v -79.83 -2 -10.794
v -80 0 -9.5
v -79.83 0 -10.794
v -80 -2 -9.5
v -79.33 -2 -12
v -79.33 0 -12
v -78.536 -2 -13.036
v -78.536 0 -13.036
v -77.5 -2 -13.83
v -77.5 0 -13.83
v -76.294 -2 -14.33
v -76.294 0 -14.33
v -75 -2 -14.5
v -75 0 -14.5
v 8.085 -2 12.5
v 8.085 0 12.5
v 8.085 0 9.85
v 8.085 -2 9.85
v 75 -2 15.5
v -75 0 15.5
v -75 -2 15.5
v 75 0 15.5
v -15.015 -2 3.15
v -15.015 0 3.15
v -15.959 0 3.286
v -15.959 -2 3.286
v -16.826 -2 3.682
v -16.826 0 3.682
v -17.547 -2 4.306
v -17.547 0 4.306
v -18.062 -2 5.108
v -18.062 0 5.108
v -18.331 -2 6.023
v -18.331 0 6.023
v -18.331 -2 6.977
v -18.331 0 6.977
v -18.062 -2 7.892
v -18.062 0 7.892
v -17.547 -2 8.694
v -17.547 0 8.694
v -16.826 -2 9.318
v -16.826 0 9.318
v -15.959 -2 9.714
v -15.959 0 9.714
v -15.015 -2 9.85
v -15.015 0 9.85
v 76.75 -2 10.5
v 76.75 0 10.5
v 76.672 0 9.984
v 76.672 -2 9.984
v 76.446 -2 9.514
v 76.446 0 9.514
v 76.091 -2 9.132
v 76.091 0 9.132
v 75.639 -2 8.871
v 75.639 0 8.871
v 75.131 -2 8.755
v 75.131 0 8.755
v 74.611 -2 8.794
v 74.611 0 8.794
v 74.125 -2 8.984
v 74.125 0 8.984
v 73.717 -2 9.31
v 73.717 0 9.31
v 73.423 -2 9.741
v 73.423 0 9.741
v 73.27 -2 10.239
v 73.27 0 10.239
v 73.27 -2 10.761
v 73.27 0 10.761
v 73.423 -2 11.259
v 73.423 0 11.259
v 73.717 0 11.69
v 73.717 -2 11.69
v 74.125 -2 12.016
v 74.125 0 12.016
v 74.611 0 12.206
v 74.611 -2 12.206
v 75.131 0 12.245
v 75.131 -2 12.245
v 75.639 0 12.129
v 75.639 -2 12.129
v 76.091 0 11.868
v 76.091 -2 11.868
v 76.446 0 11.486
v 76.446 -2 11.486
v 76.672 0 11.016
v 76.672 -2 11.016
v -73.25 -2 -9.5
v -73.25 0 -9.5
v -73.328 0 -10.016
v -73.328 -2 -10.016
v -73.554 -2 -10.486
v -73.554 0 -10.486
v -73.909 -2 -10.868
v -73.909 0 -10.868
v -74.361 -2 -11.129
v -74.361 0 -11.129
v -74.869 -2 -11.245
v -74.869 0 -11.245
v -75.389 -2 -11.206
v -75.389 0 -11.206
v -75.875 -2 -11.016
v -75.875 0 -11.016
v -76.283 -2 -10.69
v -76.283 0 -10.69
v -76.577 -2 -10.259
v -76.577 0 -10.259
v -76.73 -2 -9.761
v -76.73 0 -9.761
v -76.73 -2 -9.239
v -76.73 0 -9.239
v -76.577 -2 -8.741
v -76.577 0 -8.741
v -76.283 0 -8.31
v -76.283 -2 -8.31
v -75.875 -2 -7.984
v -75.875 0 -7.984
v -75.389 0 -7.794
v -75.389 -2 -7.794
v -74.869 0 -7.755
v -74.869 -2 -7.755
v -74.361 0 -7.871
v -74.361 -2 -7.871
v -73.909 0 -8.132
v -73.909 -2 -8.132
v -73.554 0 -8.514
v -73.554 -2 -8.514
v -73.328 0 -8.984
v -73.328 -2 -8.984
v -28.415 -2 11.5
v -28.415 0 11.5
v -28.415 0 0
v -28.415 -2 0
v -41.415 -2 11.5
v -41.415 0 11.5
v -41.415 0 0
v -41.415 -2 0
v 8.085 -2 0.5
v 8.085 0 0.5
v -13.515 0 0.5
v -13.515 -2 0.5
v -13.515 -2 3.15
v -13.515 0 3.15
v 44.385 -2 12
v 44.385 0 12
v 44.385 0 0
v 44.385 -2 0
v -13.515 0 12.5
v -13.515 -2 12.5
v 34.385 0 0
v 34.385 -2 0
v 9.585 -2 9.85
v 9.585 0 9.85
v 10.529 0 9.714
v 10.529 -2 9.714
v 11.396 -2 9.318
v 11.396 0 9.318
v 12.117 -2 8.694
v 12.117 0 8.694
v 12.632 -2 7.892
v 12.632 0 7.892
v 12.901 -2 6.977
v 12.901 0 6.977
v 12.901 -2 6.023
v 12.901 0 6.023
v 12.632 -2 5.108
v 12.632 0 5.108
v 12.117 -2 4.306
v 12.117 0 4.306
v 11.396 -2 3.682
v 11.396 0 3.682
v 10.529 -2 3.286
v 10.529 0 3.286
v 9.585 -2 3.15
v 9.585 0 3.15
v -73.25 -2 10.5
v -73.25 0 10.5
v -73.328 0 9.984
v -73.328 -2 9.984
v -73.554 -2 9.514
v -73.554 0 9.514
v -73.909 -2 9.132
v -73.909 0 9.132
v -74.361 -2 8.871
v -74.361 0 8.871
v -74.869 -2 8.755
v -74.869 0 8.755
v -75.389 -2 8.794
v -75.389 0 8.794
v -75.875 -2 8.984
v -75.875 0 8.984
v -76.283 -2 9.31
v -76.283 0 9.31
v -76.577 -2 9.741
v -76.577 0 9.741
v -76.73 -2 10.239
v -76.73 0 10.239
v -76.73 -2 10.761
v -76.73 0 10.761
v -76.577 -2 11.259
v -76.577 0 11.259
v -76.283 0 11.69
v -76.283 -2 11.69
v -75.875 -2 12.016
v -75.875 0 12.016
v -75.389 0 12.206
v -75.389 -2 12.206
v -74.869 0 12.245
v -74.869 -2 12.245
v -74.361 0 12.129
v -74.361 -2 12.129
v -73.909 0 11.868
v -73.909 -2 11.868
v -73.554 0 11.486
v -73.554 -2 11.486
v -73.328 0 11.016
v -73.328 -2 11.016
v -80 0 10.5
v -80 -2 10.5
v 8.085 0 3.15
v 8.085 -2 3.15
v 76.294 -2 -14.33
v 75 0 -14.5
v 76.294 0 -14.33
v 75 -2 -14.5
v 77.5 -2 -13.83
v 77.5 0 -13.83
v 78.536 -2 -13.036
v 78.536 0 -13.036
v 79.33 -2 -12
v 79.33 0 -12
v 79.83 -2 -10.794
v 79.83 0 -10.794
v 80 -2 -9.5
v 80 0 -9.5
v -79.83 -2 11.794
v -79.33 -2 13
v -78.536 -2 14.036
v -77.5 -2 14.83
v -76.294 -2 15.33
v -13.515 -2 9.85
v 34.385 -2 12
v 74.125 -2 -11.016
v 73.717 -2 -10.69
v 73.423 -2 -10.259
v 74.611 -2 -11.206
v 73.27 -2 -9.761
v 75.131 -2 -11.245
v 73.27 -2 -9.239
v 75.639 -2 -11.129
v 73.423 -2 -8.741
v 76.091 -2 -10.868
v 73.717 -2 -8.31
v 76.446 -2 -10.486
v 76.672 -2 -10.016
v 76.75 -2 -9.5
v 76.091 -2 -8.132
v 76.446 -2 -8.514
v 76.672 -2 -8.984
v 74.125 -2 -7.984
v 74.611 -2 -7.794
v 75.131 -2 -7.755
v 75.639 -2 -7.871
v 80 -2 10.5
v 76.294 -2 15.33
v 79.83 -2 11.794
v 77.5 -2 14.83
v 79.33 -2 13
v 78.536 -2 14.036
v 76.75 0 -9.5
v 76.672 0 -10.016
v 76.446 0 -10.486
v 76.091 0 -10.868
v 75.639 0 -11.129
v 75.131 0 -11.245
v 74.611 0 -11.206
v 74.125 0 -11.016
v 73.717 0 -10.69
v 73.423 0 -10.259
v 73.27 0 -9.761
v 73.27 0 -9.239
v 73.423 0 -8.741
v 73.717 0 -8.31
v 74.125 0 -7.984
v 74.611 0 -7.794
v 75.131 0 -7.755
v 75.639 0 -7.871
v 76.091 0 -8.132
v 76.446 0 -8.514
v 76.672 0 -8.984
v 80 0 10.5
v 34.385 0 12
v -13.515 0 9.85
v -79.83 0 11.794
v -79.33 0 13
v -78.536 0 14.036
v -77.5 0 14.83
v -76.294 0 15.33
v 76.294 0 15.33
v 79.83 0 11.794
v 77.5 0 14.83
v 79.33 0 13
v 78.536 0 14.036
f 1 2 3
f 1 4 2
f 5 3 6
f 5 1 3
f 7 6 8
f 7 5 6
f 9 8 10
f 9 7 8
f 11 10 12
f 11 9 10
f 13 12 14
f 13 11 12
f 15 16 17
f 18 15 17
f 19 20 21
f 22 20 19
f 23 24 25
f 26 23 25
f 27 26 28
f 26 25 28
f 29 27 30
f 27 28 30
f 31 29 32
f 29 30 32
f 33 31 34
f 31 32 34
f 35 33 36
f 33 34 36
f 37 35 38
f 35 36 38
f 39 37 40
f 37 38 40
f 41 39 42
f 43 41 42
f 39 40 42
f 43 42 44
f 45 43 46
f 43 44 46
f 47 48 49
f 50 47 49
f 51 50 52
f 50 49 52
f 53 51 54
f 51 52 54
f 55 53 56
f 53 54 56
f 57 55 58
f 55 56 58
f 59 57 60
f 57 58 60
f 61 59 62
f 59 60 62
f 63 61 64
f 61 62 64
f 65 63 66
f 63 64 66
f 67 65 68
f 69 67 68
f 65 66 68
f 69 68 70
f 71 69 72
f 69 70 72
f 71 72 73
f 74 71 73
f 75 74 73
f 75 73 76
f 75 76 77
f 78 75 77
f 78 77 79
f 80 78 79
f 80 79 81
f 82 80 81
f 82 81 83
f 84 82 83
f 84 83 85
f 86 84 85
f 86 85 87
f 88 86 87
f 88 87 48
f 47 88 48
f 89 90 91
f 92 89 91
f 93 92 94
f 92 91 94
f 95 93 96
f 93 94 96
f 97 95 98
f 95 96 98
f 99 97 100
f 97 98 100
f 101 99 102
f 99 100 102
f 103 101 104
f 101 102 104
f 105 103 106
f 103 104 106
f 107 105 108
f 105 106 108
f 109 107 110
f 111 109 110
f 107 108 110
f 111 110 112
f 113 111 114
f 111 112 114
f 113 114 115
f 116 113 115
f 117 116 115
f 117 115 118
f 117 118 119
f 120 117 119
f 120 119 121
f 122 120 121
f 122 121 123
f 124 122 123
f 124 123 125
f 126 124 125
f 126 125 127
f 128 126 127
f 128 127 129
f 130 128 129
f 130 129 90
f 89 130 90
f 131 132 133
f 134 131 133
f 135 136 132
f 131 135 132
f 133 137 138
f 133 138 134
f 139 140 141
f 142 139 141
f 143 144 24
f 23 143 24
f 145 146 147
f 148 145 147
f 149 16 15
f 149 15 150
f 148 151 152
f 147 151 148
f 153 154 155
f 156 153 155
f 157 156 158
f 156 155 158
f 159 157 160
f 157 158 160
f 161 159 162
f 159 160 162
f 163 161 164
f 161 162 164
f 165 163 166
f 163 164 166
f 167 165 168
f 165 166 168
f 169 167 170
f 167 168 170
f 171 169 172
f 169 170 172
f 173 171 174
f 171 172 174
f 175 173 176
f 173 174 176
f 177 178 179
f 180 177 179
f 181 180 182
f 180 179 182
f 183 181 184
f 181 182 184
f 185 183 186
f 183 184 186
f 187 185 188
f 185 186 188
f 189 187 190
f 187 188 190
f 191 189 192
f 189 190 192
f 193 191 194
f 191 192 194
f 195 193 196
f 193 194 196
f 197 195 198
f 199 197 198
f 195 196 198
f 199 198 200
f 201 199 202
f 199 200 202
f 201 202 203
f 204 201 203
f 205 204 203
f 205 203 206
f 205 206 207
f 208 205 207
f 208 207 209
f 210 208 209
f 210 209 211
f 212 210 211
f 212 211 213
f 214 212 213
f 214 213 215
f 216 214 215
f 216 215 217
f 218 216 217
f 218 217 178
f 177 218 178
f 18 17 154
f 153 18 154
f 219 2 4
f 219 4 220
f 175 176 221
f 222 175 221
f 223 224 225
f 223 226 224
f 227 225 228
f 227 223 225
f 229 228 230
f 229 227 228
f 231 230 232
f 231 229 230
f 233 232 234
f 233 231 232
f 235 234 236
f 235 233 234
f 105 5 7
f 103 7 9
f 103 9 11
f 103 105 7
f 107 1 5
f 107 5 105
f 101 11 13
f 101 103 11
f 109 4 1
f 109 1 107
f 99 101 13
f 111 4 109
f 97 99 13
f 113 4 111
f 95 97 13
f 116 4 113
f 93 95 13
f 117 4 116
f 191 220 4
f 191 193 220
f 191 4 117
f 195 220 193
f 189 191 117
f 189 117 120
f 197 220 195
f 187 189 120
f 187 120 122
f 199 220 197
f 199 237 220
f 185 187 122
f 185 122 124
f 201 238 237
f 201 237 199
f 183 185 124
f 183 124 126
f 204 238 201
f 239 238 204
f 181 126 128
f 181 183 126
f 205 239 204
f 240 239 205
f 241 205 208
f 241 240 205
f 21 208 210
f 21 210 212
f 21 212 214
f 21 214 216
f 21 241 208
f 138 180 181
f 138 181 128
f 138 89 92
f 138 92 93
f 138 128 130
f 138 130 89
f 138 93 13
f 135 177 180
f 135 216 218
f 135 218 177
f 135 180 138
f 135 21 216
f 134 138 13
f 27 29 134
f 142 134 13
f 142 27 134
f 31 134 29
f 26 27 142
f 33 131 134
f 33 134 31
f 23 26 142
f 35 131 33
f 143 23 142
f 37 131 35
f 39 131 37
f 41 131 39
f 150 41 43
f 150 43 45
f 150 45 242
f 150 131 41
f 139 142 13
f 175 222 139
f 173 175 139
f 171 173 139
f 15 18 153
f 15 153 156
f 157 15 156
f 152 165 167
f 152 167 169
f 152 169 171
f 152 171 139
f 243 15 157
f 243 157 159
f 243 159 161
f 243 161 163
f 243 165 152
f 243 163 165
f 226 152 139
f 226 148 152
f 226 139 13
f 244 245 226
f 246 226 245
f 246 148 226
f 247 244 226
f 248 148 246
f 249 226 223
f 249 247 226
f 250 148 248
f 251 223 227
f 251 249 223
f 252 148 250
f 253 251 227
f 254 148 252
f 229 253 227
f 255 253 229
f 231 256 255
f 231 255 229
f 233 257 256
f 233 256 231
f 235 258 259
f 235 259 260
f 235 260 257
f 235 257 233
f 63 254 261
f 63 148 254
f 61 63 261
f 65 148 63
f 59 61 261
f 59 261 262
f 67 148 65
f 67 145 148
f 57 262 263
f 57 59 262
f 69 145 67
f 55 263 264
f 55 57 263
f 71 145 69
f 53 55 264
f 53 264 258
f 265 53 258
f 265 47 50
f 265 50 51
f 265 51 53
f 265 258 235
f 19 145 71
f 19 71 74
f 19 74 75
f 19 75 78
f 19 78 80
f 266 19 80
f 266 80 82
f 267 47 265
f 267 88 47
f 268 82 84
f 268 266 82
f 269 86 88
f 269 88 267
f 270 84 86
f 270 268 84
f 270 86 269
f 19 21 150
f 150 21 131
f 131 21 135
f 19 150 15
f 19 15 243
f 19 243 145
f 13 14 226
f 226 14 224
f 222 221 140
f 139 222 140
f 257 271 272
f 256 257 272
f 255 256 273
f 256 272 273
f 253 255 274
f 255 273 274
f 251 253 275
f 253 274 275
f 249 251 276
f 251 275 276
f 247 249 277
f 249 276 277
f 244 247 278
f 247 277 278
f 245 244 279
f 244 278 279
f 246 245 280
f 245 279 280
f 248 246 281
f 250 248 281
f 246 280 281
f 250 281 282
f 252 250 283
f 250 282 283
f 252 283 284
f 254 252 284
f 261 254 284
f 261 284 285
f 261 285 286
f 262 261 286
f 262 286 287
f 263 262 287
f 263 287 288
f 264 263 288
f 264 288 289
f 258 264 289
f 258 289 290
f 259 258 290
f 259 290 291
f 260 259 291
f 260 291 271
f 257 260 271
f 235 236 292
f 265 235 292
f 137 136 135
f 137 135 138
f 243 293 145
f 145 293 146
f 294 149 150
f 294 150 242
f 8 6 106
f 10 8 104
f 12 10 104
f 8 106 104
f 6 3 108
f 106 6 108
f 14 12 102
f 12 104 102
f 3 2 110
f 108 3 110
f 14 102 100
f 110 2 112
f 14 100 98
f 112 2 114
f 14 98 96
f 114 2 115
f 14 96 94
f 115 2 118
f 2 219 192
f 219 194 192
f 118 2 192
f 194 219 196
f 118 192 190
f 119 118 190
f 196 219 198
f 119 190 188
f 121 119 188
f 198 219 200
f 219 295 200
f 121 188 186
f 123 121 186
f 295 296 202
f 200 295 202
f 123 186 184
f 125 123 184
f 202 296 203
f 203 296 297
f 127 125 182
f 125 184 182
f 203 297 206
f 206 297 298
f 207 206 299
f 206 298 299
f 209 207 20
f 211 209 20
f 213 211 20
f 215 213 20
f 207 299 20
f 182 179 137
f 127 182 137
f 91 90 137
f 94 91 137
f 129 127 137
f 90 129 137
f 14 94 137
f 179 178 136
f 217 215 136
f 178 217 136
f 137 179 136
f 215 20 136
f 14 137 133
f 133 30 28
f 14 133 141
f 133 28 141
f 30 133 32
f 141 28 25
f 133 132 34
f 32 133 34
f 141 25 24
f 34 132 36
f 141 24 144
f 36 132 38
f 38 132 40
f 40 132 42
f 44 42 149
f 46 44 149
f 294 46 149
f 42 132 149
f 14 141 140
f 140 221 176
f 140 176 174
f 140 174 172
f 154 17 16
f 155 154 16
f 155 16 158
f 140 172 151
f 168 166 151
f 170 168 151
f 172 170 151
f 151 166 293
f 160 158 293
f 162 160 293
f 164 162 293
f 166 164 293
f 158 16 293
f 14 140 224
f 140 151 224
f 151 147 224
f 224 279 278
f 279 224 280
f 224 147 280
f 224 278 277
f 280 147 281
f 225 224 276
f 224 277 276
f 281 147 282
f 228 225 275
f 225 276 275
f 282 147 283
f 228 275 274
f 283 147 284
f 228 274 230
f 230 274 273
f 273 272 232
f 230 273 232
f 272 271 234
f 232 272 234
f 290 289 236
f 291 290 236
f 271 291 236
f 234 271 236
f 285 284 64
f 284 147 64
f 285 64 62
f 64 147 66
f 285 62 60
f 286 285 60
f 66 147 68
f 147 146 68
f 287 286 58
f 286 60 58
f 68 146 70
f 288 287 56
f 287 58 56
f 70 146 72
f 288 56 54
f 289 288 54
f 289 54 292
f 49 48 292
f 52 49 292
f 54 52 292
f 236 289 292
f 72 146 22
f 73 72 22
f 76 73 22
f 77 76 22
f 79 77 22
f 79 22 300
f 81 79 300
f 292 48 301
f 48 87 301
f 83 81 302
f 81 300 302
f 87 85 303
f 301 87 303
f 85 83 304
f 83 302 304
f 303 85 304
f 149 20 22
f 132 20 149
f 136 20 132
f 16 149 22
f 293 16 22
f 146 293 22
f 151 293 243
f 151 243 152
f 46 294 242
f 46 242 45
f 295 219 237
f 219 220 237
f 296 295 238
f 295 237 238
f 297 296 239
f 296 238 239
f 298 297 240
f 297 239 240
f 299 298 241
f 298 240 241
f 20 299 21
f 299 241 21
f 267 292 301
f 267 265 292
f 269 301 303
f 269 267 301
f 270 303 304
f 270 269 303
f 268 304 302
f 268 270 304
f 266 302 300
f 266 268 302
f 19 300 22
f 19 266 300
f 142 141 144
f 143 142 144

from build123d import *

# Parameters (mm, degrees)
SKETCH017_W          = 160
SKETCH017_H          = 30
PAD014_DEPTH         = 2
FILLET_R             = 5
SKETCH018_R          = 1.75
SKETCH018_W          = 13
SKETCH018_H          = 11.5
SKETCH018_W_2        = 10
SKETCH018_H_2        = 12
POCKET009_DEPTH      = 2.001
POCKET009_DEPTH_BACK = 0.001


with BuildPart() as part:
    # Sketch017 → Pad014 (new body)
    with BuildSketch(Plane.XZ):
        with Locations((0, 0.5)):
            Rectangle(SKETCH017_W, SKETCH017_H)
    extrude(amount=PAD014_DEPTH)

    # Fillet
    fillet_edges = [part.edges().sort_by_distance(p)[0] for p in [
        (80, -1, 15.5),
        (80, -1, -14.5),
        (-80, -1, 15.5),
        (-80, -1, -14.5),
    ]]
    fillet(fillet_edges, radius=FILLET_R)

    # Sketch018 (on Face5 of Pad014) → Pocket009 (cut, two sides)
    with BuildSketch(Plane(origin=(0, 0, 0), x_dir=(1, 0, 0), z_dir=(0, 1, 0))) as pocket009_sk:
        with Locations((-75, 9.5)):
            Circle(SKETCH018_R)
        with Locations((-75, -10.5)):
            Circle(SKETCH018_R)
        with Locations((75, 9.5)):
            Circle(SKETCH018_R)
        with Locations((75, -10.5)):
            Circle(SKETCH018_R)
        with BuildLine():
            Line((8.085, -12.5), (-13.515, -12.5))
            Line((-13.515, -12.5), (-13.515, -9.85))
            Line((-13.515, -9.85), (-15.015, -9.85))
            ThreePointArc((-15.015, -3.15), (-18.365, -6.5), (-15.015, -9.85))
            Line((-13.515, -3.15), (-15.015, -3.15))
            Line((-13.515, -0.5), (-13.515, -3.15))
            Line((8.085, -0.5), (-13.515, -0.5))
            Line((8.085, -3.15), (8.085, -0.5))
            Line((9.585, -3.15), (8.085, -3.15))
            ThreePointArc((9.585, -9.85), (12.935, -6.5), (9.585, -3.15))
            Line((8.085, -9.85), (9.585, -9.85))
            Line((8.085, -12.5), (8.085, -9.85))
        make_face()
        with Locations((-34.915, -5.75)):
            Rectangle(SKETCH018_W, SKETCH018_H)
        with Locations((39.385, -6)):
            Rectangle(SKETCH018_W_2, SKETCH018_H_2)
    extrude(amount=-POCKET009_DEPTH, mode=Mode.SUBTRACT)
    extrude(pocket009_sk.sketch, amount=POCKET009_DEPTH_BACK, mode=Mode.SUBTRACT)


solid = part.part
